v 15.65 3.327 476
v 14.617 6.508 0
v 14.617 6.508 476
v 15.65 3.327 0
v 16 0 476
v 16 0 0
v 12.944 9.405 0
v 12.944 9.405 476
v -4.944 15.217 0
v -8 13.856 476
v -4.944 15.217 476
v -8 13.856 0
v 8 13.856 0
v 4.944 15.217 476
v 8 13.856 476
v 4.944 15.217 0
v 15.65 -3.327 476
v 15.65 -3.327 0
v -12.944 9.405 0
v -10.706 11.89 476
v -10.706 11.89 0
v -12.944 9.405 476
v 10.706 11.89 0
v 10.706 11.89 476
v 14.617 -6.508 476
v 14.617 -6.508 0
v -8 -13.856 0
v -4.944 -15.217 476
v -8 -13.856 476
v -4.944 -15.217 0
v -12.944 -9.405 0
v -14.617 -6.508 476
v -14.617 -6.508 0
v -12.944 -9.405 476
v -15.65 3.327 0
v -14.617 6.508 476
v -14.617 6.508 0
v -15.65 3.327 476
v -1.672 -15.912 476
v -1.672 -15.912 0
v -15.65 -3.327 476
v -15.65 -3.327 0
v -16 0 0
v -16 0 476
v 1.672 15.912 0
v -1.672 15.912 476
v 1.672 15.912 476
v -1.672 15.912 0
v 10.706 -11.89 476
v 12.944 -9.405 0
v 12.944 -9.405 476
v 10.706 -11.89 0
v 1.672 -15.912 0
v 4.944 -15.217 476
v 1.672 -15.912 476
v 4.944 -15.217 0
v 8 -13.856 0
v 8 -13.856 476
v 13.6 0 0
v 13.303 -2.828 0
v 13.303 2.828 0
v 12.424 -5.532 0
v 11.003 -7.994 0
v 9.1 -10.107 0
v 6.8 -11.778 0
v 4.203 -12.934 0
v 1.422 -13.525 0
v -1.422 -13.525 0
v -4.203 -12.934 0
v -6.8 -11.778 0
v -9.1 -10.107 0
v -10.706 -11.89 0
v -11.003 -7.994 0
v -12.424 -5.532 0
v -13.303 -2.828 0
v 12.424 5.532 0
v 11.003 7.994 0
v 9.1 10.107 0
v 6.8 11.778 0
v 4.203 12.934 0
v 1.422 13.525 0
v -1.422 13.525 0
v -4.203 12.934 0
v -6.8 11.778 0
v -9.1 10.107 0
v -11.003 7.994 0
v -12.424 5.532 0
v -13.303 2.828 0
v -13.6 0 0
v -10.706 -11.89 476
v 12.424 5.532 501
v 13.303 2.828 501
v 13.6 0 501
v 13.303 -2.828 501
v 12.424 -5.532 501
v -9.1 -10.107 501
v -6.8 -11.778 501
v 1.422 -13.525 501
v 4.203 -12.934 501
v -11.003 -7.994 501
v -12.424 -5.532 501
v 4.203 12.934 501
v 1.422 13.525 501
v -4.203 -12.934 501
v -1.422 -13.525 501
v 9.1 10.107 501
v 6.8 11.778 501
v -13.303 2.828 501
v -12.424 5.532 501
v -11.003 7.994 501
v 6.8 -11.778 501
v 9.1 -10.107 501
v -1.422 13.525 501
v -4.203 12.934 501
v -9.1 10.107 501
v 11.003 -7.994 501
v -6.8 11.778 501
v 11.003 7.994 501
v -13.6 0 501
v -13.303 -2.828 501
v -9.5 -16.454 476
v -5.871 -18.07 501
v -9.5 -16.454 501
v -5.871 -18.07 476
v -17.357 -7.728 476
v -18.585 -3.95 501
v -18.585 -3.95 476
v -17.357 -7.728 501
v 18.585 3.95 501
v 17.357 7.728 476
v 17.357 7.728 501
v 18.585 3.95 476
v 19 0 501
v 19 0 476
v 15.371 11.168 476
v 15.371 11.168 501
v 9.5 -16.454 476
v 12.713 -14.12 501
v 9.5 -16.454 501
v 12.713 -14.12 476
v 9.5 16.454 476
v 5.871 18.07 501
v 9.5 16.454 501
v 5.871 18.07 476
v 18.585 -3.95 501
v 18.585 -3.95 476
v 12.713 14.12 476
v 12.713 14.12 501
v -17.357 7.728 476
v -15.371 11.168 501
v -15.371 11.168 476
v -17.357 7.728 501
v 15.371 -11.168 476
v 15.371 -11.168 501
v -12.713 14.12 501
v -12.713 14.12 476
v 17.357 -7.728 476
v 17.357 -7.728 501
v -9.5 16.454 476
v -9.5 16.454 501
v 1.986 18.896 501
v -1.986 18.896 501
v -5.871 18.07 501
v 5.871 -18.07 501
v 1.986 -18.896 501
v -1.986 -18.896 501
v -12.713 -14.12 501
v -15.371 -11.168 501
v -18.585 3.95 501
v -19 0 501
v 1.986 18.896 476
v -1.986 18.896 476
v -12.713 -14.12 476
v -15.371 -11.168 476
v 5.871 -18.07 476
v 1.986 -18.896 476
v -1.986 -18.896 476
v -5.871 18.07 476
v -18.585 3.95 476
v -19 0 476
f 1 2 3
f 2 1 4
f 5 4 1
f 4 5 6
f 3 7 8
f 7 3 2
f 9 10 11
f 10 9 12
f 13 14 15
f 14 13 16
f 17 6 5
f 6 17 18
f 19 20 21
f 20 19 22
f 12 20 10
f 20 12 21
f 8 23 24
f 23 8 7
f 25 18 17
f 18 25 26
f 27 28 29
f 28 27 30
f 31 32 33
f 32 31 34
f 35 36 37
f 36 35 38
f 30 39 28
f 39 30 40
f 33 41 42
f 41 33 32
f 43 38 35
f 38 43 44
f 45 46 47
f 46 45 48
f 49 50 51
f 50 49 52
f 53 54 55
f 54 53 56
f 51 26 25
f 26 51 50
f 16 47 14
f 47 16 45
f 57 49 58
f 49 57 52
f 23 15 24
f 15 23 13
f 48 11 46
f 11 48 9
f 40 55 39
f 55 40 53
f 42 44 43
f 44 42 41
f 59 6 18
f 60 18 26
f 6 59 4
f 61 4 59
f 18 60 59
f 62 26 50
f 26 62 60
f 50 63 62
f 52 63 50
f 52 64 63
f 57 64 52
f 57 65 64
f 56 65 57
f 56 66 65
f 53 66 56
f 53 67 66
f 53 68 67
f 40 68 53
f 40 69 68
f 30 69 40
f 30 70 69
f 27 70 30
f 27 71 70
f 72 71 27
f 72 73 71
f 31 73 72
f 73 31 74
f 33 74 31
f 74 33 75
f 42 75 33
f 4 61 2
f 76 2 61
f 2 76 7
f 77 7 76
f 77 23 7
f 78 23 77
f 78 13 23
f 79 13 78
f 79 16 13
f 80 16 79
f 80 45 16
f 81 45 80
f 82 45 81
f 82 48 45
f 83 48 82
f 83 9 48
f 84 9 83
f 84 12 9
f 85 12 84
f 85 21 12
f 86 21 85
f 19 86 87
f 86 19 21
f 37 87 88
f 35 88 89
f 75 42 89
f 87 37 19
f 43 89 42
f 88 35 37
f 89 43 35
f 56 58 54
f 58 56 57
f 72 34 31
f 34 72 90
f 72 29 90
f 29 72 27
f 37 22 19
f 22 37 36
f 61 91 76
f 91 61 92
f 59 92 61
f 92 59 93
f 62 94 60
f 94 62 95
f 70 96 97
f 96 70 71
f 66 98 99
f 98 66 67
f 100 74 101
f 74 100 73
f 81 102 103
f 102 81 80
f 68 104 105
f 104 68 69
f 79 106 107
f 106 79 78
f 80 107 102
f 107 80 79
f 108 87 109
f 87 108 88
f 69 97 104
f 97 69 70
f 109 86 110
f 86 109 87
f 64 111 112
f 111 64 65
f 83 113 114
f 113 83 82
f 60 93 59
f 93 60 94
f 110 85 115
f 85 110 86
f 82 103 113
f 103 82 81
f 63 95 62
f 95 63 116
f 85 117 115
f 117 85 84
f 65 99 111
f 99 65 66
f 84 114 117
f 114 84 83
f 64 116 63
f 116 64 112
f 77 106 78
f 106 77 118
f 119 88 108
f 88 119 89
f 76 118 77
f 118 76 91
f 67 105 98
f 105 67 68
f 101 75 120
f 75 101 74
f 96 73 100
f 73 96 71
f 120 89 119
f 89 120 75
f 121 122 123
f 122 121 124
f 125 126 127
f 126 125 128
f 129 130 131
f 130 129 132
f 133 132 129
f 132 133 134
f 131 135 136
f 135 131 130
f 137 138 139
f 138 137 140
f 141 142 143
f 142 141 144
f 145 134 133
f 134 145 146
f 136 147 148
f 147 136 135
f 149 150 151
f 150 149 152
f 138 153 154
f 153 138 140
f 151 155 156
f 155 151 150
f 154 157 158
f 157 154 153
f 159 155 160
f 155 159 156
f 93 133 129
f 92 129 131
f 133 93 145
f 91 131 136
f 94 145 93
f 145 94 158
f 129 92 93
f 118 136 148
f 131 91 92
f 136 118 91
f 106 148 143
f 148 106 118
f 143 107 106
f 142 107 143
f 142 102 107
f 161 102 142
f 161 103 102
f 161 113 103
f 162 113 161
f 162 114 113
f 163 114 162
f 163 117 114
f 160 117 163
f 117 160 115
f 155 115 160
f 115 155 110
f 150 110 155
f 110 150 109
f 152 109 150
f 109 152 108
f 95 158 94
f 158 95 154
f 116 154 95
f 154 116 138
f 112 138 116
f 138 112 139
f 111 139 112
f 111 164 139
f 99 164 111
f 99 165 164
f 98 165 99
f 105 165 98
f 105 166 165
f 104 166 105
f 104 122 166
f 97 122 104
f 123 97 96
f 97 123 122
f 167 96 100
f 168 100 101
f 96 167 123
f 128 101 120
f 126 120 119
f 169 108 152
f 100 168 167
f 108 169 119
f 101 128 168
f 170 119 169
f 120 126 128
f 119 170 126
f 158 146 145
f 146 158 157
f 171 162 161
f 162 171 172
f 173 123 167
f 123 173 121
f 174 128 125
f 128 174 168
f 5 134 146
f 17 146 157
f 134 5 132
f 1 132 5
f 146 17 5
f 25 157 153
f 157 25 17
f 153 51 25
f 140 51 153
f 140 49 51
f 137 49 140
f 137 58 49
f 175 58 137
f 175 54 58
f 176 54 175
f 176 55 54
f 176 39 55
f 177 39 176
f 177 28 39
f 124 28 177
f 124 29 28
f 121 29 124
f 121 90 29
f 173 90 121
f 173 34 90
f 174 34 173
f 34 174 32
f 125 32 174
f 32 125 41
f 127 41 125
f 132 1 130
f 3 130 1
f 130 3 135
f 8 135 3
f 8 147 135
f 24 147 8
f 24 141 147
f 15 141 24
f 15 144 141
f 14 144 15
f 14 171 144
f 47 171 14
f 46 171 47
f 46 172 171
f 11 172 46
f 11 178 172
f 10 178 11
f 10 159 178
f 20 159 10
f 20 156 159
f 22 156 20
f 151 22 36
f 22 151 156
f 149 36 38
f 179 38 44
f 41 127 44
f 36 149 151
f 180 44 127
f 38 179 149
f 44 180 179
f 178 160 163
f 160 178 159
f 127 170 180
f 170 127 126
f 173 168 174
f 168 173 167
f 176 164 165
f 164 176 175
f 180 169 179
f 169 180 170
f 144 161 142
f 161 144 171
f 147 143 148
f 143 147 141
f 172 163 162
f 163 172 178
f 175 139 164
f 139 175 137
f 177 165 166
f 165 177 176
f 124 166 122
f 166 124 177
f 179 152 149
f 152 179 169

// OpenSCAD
// Parameters
nominal_diameter_mm = 32; //[16:64:1]
length_mm = 500; //[250:1000:1]
wall_thickness_mm = 2.4; //[1.2:4.8:0.1]
fitting_length_mm = 25; //[12.5:50:0.5]
fitting_radial_thickness_mm = 3; //[1.5:6:0.5]
overlap_mm = 1; //[0.5:2:0.1]

// HT Pipe - complete geometry
module ht_pipe() {
  color([0.85, 0.85, 0.8]) { // PVC color
    // Pipe body
    difference() {
      cylinder(h=length_mm, r=nominal_diameter_mm/2, center=false);
      translate([0, 0, 0])
        cylinder(h=length_mm, r=nominal_diameter_mm/2 - wall_thickness_mm, center=false);
    }
    
    // End fitting
    translate([0, 0, length_mm - fitting_length_mm + overlap_mm]) {
      difference() {
        cylinder(h=fitting_length_mm, r=nominal_diameter_mm/2 + fitting_radial_thickness_mm, center=false);
        translate([0, 0, 0])
          cylinder(h=fitting_length_mm + overlap_mm, r=nominal_diameter_mm/2 - wall_thickness_mm, center=false);
      }
    }
  }
}

// Assembly
module assembly() {
  ht_pipe();
}

assembly();
